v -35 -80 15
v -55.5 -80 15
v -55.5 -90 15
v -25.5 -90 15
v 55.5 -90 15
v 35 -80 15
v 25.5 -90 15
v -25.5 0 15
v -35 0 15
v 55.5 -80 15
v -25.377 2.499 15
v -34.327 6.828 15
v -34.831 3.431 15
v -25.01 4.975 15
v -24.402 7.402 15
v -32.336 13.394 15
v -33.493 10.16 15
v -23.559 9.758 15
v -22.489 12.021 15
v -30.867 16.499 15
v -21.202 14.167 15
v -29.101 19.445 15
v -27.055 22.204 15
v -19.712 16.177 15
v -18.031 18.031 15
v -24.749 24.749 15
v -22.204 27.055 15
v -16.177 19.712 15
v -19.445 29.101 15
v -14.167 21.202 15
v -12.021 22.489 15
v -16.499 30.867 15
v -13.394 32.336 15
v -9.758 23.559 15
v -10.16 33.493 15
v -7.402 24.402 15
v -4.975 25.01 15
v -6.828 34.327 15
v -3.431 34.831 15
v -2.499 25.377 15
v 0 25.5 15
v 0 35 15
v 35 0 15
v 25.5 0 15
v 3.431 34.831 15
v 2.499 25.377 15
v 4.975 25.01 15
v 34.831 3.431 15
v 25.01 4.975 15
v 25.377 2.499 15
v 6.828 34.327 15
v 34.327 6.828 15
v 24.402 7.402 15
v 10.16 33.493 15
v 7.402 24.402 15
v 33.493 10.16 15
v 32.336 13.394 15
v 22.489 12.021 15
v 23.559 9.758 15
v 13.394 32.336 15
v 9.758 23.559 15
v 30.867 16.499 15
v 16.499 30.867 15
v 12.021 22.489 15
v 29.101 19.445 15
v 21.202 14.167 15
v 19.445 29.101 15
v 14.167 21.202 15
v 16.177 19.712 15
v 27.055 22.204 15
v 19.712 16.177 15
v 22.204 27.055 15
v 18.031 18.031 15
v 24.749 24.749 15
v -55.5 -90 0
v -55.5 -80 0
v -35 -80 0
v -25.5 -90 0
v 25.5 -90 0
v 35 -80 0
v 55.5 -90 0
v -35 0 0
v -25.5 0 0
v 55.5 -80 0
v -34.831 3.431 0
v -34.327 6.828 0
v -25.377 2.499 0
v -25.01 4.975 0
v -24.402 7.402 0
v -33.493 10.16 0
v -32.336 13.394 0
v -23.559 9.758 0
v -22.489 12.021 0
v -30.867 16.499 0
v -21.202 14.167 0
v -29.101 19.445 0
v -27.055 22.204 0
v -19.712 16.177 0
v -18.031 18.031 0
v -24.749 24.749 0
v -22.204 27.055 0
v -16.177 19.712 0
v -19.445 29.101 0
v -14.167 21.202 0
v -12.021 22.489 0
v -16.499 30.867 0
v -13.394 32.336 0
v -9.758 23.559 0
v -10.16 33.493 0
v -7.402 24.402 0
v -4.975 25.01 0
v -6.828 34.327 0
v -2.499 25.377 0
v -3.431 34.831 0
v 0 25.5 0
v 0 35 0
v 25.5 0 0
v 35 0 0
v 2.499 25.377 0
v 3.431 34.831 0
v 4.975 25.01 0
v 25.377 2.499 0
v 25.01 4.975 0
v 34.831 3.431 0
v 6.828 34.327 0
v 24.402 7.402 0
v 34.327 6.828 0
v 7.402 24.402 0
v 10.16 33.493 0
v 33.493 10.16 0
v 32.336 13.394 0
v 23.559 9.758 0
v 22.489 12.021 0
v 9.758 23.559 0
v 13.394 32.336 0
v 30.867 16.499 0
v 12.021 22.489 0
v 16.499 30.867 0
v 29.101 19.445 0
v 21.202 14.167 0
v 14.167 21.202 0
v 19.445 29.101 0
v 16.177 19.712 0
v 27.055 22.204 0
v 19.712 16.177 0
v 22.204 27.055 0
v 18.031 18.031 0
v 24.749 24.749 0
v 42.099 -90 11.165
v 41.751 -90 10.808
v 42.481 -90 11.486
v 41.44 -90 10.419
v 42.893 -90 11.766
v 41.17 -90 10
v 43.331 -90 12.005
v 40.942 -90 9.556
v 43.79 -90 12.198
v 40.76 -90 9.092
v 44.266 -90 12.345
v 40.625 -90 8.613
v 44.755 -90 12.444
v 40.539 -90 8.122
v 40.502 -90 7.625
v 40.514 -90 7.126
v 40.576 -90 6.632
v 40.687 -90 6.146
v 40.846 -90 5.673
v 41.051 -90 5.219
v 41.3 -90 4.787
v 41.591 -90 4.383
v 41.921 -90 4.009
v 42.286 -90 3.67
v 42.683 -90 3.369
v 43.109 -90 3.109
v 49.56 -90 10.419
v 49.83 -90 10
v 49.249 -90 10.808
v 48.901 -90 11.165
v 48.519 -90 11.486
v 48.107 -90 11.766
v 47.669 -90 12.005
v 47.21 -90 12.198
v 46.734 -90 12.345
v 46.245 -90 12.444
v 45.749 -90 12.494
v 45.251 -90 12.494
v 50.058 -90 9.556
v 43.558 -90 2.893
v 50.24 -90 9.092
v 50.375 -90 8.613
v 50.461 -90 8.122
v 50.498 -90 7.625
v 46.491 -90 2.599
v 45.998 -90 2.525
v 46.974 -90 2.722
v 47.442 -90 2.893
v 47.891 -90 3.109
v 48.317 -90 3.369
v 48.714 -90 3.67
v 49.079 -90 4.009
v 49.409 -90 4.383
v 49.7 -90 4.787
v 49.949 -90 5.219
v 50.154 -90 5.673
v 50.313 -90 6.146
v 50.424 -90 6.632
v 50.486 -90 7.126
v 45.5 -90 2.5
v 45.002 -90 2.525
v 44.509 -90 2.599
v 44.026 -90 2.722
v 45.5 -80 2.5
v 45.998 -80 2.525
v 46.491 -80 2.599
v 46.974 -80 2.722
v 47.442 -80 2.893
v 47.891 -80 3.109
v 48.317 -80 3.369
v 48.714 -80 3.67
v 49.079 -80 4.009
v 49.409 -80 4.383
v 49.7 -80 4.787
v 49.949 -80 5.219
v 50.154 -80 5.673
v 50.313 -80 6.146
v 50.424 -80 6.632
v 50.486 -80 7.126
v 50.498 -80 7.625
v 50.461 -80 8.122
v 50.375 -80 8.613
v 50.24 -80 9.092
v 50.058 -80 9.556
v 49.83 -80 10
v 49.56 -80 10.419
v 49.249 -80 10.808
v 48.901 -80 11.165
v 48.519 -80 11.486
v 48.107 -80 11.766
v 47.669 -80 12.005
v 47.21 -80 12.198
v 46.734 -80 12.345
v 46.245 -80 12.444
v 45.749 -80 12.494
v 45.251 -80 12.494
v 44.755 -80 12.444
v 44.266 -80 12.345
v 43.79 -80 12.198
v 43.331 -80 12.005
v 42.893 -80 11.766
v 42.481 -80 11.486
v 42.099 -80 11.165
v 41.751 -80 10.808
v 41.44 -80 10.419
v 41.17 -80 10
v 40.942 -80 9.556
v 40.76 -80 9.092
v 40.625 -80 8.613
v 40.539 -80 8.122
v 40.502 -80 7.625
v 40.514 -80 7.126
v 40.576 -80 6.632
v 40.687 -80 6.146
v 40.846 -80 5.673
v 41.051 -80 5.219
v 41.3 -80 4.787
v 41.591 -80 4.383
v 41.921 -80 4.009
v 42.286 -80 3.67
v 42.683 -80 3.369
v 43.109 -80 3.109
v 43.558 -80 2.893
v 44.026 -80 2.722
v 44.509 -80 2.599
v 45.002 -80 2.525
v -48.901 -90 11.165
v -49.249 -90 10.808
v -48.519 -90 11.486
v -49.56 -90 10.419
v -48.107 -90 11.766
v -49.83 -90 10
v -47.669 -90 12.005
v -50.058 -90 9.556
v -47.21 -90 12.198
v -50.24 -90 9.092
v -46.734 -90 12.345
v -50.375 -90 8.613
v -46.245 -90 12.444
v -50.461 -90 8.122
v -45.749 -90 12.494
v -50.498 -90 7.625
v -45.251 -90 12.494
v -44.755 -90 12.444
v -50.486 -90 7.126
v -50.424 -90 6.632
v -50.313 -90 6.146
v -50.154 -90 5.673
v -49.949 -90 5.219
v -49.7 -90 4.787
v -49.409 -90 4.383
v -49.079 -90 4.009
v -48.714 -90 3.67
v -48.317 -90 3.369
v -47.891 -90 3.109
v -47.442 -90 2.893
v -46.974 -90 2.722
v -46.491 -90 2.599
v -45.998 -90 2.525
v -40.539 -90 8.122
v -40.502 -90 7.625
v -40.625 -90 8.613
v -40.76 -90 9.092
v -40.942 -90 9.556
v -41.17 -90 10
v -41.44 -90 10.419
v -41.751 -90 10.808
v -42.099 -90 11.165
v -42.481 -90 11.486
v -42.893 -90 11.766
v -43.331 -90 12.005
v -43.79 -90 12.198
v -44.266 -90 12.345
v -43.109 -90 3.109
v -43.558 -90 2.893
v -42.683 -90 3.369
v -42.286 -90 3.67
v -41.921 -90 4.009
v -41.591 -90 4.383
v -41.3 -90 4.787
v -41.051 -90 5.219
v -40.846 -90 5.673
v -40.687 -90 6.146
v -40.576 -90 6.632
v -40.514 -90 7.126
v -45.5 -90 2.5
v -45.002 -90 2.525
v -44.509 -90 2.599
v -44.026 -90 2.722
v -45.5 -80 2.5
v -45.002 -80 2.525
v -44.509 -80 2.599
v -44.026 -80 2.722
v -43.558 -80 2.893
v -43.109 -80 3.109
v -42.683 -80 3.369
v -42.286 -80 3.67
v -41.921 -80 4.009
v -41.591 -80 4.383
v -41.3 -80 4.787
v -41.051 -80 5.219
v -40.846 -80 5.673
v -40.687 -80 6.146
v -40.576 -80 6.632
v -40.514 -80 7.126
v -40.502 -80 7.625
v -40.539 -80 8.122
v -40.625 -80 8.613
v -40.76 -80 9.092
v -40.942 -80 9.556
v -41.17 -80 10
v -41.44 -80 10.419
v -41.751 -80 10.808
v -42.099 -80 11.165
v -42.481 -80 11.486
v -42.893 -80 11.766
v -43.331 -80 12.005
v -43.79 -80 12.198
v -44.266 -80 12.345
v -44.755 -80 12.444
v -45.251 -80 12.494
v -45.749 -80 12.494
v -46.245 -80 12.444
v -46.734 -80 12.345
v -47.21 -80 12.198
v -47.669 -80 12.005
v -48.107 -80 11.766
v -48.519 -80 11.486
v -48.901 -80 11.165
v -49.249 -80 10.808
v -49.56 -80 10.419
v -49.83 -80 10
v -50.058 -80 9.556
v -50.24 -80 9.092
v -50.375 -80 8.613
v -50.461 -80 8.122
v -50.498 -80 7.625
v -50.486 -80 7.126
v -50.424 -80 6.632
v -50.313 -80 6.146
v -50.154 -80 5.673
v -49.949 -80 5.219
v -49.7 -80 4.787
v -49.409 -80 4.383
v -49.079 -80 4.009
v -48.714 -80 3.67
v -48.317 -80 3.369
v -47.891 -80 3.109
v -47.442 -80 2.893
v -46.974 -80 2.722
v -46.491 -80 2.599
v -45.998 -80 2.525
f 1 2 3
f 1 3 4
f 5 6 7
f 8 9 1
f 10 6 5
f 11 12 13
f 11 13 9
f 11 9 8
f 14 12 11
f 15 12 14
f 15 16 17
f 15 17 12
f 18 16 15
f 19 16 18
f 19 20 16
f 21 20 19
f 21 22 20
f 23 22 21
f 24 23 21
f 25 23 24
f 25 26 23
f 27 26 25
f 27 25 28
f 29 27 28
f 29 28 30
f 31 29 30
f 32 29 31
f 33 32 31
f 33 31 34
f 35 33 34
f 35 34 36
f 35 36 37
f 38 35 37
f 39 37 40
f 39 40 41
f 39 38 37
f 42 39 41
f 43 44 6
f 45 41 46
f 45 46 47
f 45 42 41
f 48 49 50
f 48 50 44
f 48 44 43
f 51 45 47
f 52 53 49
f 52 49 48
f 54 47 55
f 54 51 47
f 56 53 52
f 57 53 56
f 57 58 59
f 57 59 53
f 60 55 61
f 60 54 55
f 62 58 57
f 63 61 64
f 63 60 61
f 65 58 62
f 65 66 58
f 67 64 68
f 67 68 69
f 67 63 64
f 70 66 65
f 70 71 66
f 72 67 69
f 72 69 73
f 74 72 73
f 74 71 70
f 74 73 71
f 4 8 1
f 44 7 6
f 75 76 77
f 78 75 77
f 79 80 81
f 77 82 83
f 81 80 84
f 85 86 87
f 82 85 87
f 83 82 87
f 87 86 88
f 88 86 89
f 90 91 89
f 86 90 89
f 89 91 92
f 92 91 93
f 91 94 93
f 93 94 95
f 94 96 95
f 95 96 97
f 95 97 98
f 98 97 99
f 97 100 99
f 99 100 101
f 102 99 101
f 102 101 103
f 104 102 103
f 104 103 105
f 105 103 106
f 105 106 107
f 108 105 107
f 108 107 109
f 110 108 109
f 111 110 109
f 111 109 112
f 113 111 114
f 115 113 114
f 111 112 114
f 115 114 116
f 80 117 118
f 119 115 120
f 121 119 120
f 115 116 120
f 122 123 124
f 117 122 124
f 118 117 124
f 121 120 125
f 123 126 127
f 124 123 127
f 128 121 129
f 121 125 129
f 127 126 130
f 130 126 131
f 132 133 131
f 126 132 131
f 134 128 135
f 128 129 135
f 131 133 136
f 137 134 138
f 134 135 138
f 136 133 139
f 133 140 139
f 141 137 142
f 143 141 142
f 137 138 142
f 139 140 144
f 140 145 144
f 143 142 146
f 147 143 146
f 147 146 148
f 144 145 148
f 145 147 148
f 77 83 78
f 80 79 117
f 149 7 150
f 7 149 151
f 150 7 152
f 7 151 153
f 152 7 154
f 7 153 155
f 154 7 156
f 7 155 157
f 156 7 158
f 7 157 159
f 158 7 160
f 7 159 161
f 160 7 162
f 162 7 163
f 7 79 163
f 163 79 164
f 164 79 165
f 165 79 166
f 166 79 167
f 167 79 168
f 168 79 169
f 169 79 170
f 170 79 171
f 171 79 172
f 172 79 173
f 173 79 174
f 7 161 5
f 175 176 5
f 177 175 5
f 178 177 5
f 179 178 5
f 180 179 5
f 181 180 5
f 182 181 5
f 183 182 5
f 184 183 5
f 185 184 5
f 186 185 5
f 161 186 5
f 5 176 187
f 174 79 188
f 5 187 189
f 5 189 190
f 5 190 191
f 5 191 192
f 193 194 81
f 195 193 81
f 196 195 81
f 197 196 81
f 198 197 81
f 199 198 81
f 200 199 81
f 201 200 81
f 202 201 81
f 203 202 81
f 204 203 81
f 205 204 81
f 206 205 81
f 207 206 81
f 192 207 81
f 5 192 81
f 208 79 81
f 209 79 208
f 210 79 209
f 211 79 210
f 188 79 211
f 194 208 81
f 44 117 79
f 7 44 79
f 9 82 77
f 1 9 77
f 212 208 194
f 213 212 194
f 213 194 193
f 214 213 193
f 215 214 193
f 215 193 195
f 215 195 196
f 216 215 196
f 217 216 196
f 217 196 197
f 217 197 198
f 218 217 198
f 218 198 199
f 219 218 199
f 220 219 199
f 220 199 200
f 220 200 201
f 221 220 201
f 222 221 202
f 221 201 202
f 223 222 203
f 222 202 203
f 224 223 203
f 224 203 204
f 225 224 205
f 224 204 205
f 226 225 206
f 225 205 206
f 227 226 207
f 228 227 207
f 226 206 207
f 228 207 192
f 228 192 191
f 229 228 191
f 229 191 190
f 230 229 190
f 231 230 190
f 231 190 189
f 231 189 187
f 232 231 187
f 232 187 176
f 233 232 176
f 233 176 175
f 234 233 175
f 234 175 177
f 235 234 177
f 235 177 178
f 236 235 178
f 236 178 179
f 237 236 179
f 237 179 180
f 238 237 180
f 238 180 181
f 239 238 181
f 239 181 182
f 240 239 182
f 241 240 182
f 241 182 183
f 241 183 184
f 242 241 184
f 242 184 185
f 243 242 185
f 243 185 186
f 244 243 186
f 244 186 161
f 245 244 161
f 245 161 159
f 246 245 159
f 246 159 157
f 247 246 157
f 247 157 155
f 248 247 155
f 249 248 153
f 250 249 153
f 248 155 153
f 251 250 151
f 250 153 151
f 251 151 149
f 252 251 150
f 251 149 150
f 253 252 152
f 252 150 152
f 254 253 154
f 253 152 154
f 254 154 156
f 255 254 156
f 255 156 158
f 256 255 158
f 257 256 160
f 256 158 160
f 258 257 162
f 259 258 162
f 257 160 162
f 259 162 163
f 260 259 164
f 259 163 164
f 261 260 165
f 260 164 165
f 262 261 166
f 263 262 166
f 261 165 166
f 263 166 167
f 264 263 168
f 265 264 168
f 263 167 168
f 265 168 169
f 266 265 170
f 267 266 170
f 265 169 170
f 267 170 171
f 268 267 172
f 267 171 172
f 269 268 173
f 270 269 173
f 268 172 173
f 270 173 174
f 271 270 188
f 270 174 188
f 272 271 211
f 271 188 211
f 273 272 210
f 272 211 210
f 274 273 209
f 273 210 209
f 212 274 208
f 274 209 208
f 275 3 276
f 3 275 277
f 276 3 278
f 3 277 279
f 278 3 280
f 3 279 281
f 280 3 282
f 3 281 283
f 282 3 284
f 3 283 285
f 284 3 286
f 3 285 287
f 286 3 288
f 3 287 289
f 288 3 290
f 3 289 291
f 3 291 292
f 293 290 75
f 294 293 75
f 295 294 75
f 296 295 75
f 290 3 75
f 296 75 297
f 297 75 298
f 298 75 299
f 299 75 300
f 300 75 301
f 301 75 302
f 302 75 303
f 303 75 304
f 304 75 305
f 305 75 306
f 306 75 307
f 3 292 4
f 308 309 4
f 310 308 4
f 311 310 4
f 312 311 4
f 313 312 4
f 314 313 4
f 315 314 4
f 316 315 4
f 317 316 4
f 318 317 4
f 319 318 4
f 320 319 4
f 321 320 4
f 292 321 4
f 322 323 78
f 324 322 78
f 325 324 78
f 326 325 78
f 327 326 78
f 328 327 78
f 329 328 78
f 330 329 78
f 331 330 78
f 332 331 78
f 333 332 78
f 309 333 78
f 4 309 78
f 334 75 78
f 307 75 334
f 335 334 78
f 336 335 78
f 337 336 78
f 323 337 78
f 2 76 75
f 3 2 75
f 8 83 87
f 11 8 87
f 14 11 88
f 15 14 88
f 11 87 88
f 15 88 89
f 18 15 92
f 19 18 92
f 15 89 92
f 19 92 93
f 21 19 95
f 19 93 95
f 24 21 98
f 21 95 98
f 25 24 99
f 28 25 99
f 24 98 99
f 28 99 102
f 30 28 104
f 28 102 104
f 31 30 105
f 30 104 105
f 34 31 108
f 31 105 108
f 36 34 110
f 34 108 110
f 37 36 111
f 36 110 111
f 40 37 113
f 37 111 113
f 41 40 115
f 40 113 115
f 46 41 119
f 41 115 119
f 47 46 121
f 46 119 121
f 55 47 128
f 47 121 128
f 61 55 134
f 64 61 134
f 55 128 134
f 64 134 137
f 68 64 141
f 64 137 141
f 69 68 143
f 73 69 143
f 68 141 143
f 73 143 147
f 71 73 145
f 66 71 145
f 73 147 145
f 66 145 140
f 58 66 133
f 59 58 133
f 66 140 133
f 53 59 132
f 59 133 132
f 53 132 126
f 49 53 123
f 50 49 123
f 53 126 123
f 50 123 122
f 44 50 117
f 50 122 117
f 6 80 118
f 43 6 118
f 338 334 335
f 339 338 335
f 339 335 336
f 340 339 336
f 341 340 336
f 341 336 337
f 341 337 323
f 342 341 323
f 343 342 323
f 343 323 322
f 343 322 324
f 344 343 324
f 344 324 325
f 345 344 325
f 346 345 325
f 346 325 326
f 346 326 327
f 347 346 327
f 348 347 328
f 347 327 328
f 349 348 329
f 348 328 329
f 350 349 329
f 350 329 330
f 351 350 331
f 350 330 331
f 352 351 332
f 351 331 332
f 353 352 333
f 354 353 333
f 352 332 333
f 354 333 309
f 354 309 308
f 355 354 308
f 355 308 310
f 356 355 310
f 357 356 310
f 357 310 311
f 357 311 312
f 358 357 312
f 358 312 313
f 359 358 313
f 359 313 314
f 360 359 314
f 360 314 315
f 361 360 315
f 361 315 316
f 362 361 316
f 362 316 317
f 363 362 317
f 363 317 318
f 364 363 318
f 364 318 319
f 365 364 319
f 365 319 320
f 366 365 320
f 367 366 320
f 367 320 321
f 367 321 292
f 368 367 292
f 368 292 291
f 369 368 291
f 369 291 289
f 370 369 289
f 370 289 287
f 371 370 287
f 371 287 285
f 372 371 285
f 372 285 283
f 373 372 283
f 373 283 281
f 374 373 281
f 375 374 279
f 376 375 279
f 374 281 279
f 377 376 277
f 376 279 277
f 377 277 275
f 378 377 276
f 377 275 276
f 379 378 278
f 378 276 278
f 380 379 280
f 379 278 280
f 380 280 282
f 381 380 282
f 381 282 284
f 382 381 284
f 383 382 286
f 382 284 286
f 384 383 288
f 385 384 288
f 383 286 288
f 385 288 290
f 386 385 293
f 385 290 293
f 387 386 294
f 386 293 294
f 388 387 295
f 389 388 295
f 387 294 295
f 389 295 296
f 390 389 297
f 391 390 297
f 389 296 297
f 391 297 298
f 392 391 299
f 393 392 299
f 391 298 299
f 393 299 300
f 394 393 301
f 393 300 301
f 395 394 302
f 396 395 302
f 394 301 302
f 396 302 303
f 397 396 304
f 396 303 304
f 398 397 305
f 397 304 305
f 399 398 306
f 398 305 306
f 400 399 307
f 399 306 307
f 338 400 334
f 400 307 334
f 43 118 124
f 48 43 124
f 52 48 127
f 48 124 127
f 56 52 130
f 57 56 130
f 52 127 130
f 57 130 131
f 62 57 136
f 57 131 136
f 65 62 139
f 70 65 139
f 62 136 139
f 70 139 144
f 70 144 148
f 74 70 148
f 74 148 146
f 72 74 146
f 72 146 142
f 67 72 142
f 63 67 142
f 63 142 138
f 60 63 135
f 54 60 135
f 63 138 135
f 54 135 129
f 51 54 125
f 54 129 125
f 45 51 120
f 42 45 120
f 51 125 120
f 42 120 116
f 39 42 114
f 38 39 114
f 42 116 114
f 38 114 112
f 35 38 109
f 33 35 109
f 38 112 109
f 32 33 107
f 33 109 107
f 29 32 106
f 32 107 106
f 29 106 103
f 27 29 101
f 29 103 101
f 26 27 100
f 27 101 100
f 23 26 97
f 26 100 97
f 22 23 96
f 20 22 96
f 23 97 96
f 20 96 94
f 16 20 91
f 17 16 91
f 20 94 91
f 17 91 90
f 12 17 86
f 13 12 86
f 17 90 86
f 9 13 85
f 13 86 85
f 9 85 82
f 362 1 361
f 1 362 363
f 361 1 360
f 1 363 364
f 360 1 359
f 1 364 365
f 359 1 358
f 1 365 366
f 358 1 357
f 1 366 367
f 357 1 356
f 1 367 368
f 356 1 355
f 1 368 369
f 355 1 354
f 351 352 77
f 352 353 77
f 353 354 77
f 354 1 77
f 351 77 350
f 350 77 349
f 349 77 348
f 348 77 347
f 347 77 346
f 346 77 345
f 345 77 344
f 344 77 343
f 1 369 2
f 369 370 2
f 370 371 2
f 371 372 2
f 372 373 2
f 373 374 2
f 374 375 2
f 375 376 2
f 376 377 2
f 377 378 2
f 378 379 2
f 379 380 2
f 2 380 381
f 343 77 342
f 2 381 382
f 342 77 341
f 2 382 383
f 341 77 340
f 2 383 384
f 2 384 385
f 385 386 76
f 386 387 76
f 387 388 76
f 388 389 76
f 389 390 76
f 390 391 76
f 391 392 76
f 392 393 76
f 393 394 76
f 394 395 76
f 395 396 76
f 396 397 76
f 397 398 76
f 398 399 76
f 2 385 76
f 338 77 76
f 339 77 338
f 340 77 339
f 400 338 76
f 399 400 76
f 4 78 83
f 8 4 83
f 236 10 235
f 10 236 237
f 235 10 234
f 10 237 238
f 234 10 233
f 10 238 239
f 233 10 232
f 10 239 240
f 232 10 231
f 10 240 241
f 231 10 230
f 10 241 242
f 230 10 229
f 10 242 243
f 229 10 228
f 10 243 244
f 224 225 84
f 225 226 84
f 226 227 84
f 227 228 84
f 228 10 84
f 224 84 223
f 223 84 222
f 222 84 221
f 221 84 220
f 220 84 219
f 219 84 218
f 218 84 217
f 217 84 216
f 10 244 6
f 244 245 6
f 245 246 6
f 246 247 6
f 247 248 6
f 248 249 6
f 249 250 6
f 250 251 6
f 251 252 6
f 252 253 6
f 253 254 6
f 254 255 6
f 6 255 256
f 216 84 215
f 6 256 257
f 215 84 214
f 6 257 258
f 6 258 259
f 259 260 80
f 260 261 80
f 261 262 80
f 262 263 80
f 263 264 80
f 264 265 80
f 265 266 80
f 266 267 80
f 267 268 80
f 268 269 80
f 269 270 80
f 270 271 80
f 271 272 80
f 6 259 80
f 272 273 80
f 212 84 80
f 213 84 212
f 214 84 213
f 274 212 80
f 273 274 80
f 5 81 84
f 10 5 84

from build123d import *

# Parameters (mm, degrees)
BOSS_EXTRUDE1_DEPTH = 15
SKETCH3_R           = 5
CUT_EXTRUDE2_DEPTH  = 138.587245048


with BuildPart() as part:
    # Sketch1 → Boss-Extrude1 (new body)
    with BuildSketch(Plane.XY):
        with BuildLine():
            Line((55.5, -90), (55.5, -80))
            Line((55.5, -80), (35, -80))
            Line((35, -80), (35, 0))
            ThreePointArc((35, 0), (0, 35), (-35, 0))
            Line((-35, 0), (-35, -80))
            Line((-35, -80), (-55.5, -80))
            Line((-55.5, -80), (-55.5, -90))
            Line((-55.5, -90), (-25.5, -90))
            Line((-25.5, -90), (-25.5, 0))
            ThreePointArc((-25.5, 0), (0, 25.5), (25.5, 0))
            Line((25.5, 0), (25.5, -90))
            Line((25.5, -90), (55.5, -90))
        make_face()
    extrude(amount=BOSS_EXTRUDE1_DEPTH)

    # Sketch3 → Cut-Extrude2 (cut, through all)
    with BuildSketch(Plane.XZ.offset(90)):
        with Locations(Location((-45.5, 7.5, 0), (0, 0, 270))):
            Circle(SKETCH3_R)
        with Locations(Location((45.5, 7.5, 0), (0, 0, 270))):
            Circle(SKETCH3_R)
    extrude(amount=-CUT_EXTRUDE2_DEPTH, mode=Mode.SUBTRACT)


solid = part.part
